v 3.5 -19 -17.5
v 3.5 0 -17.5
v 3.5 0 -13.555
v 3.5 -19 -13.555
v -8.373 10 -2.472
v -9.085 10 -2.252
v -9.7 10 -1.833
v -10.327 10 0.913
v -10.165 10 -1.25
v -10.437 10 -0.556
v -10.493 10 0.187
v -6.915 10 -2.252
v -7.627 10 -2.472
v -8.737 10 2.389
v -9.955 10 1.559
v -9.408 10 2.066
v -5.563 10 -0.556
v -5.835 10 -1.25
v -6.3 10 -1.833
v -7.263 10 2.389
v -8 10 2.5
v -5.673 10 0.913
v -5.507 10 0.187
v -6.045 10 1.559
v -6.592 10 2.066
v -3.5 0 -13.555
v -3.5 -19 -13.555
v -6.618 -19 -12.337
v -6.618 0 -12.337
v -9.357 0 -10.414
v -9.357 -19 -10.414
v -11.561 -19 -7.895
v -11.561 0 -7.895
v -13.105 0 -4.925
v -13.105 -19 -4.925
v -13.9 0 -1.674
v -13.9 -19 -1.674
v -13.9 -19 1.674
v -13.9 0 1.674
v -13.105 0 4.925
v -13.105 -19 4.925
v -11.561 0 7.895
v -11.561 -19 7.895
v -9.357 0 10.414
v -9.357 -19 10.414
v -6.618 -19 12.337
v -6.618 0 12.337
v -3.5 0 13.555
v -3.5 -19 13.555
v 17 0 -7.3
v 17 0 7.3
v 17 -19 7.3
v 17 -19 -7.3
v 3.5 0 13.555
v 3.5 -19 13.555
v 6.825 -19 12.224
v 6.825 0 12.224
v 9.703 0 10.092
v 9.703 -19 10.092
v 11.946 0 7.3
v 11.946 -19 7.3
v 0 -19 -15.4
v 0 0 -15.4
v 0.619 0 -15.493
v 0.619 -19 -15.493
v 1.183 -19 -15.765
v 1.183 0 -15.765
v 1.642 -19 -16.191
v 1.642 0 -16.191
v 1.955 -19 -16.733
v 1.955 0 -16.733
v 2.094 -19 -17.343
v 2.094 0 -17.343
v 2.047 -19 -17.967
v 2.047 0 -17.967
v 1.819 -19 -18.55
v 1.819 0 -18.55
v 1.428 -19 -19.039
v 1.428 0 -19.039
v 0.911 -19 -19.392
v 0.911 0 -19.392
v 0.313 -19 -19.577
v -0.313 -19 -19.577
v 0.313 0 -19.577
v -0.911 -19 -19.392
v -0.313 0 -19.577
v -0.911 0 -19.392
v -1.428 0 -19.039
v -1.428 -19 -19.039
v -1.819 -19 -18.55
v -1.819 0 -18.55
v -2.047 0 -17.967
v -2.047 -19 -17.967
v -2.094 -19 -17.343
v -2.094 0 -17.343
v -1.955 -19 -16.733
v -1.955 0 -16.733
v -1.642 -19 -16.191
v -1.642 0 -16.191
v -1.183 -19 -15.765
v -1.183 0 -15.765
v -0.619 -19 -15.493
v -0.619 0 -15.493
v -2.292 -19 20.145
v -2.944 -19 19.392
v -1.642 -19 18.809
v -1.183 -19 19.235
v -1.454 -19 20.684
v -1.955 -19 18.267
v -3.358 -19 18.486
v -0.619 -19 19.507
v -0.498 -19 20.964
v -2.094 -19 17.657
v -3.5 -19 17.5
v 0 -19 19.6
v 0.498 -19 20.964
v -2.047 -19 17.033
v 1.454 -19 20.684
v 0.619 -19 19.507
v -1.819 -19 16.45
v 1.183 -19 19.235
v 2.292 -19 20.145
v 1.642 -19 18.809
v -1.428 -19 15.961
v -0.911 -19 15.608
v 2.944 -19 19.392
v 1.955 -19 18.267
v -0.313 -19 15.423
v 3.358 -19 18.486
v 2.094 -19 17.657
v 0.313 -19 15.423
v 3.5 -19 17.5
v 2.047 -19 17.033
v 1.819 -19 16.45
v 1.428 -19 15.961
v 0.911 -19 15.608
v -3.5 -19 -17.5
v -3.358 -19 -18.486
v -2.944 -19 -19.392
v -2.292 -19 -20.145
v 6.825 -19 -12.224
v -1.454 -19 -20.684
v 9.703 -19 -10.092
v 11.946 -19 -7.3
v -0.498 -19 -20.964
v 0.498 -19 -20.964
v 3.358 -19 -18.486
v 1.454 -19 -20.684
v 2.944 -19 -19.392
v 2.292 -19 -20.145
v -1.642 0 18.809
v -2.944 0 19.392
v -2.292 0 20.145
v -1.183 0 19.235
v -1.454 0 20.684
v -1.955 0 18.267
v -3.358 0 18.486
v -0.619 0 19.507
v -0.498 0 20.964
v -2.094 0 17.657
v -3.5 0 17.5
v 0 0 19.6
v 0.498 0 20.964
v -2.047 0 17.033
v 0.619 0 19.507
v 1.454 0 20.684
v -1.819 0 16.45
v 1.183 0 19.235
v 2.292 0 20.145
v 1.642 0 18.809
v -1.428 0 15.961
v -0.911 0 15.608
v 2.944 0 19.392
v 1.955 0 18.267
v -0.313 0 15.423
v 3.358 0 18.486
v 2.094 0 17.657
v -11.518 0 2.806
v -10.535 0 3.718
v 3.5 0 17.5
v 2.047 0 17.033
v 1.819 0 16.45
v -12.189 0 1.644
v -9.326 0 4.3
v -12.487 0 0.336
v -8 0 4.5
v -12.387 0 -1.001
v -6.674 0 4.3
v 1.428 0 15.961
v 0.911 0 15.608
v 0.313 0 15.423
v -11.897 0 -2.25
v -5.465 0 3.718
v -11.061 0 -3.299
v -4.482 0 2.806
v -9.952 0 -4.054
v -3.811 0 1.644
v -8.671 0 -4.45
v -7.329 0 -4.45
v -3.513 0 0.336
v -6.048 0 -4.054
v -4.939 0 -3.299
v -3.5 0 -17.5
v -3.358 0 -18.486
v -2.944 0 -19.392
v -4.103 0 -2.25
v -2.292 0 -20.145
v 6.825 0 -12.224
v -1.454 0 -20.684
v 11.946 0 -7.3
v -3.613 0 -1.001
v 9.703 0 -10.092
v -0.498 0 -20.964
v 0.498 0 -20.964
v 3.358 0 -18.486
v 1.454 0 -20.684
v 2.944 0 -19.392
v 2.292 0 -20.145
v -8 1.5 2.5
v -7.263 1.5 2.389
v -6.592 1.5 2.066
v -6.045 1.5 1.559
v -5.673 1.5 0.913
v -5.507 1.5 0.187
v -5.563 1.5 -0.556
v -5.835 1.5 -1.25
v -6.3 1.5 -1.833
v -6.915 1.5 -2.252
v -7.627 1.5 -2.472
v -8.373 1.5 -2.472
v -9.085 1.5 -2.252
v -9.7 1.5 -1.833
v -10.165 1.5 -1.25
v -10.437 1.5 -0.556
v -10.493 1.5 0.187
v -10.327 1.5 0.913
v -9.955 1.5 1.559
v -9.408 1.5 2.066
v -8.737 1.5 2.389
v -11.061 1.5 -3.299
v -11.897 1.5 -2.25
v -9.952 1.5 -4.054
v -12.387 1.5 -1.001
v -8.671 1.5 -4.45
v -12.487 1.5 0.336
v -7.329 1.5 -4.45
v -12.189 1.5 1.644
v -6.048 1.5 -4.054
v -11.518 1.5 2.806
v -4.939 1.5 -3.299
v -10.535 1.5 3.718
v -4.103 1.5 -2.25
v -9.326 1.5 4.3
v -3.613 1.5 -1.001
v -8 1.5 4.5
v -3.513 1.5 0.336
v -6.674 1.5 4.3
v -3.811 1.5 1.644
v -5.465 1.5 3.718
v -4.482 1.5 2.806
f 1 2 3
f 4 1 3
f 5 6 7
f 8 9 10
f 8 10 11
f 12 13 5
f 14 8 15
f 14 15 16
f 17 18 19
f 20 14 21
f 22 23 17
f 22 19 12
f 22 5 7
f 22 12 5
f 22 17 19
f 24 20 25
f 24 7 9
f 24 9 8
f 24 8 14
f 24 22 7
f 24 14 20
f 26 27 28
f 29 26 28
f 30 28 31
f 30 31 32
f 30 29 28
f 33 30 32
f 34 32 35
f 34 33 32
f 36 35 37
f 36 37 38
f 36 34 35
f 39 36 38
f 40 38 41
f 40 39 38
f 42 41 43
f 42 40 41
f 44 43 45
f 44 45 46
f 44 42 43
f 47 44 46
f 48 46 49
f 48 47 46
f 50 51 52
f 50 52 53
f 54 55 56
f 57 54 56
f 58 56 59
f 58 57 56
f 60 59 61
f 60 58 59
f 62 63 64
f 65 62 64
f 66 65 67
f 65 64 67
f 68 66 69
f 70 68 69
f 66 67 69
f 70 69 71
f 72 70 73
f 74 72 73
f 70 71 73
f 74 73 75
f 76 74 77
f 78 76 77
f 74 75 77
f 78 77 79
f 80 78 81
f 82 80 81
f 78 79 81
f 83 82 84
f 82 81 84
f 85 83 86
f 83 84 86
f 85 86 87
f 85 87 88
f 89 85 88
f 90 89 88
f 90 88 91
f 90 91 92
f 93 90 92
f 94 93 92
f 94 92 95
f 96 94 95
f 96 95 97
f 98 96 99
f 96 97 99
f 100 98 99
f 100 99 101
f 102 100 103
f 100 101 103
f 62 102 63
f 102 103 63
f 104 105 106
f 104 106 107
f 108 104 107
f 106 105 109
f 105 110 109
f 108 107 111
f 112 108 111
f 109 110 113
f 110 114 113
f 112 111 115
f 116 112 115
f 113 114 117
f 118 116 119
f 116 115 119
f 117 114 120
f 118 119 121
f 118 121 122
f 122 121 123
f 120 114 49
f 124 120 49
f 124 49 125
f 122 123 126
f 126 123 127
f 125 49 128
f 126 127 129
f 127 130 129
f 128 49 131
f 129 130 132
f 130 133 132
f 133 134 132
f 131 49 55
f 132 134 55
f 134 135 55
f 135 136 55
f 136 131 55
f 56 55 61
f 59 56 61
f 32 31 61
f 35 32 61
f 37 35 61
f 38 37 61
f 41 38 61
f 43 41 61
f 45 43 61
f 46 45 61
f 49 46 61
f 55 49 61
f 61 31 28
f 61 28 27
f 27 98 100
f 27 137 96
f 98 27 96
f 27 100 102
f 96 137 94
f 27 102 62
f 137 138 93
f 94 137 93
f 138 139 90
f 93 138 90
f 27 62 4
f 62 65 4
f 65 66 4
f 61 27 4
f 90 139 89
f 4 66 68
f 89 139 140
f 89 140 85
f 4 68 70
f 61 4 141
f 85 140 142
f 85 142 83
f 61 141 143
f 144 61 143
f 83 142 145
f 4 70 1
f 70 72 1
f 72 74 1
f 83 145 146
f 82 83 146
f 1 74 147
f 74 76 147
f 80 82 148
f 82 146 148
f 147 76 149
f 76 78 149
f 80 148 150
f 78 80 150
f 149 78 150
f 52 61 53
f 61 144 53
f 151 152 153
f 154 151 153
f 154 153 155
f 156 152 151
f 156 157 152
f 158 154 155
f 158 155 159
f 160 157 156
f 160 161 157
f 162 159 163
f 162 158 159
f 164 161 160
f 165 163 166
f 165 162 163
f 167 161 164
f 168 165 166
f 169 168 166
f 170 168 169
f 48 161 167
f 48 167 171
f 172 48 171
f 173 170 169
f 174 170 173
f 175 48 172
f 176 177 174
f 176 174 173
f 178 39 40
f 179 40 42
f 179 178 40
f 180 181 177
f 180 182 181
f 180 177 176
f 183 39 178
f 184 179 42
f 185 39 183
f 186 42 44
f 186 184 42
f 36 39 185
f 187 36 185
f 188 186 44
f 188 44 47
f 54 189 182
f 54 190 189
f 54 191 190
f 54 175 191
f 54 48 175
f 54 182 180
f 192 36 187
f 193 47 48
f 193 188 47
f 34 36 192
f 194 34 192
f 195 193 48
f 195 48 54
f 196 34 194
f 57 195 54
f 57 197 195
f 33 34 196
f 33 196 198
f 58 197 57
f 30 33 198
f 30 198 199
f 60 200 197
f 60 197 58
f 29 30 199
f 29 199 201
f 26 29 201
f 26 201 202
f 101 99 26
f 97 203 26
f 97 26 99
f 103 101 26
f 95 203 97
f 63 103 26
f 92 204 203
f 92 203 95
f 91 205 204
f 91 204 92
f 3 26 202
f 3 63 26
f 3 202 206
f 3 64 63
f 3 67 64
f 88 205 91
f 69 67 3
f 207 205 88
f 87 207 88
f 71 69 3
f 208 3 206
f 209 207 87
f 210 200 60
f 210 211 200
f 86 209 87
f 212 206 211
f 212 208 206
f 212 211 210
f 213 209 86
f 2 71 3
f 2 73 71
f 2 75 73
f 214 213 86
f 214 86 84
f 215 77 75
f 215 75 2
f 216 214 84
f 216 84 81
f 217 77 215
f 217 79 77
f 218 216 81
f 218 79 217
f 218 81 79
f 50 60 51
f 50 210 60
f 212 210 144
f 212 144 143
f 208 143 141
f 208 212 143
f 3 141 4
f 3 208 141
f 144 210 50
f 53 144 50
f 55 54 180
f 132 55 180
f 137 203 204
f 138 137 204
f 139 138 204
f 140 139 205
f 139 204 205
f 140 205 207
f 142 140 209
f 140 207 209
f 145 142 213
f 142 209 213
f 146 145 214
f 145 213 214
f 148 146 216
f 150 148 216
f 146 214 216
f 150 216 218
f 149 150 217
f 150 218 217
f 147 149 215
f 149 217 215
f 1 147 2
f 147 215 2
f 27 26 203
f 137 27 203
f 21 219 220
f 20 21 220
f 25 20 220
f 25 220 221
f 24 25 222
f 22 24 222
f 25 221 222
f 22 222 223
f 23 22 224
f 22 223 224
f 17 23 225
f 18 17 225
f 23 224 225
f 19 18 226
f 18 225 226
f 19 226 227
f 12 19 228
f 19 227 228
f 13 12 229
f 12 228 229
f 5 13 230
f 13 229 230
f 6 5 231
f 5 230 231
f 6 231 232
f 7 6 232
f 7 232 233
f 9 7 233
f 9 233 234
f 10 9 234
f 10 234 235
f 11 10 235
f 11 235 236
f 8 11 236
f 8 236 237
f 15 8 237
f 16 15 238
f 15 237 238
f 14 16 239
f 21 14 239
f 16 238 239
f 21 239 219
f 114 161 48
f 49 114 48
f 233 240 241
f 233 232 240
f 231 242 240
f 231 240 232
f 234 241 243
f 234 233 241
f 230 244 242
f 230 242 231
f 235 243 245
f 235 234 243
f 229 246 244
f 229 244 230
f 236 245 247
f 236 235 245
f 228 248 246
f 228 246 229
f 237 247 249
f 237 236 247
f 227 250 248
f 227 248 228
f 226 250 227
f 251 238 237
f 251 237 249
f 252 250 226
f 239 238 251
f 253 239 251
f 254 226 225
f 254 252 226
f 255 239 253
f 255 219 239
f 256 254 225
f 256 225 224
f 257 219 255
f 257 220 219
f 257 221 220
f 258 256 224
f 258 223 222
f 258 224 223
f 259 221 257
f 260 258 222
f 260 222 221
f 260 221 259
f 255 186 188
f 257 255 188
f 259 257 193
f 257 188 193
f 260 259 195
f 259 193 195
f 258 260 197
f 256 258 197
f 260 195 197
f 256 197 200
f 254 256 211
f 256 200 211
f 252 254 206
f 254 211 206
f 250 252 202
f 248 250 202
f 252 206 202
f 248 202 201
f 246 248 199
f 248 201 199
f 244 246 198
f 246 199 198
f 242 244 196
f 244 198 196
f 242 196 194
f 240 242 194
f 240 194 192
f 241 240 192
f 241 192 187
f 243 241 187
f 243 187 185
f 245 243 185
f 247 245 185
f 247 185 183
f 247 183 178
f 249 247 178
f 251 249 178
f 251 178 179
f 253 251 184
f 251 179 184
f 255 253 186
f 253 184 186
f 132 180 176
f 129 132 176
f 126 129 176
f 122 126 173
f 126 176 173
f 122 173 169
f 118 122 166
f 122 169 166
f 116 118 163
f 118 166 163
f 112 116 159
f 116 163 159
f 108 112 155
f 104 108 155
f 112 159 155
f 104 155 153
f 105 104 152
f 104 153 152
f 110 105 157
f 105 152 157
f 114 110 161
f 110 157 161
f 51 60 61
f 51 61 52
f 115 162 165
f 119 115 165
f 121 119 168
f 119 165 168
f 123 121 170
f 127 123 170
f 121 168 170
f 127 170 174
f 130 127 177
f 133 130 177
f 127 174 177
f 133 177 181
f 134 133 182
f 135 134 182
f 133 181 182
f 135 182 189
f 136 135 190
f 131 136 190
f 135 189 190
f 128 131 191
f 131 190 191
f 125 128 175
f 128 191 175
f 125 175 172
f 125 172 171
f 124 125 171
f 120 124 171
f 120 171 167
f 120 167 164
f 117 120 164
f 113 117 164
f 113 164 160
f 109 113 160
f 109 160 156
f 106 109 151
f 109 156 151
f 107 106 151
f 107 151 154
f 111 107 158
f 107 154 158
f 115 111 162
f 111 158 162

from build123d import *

# Parameters (mm, degrees)
SKETCH1_R           = 14
SKETCH1_R_2         = 2.1
SKETCH1_W           = 5.05387092
SKETCH1_H           = 14.6
BOSS_EXTRUDE1_DEPTH = 19
SKETCH2_R           = 4.5
BOSS_EXTRUDE2_DEPTH = 1.5
SKETCH3_R           = 2.5
BOSS_EXTRUDE3_DEPTH = 8.5


with BuildPart() as part:
    # Sketch1 → Boss-Extrude1 (new body)
    # profile 1 of 3: a face of its own
    with BuildSketch(Plane(origin=(0, 0, 0), x_dir=(1, 0, 0), z_dir=(0, 1, 0))):
        Circle(SKETCH1_R)
    # profile 2 of 3: a face of its own
    with BuildSketch(Plane(origin=(0, 0, 0), x_dir=(1, 0, 0), z_dir=(0, 1, 0))):
        with BuildLine():
            Line((-3.5, -17.5), (-3.5, 17.5))
            ThreePointArc((-3.5, 17.5), (0, 21), (3.5, 17.5))
            Line((3.5, 17.5), (3.5, -17.5))
            ThreePointArc((3.5, -17.5), (0, -21), (-3.5, -17.5))
        make_face()
        with Locations(Location((0, -17.5, 0), (0, 0, 270))):
            Circle(SKETCH1_R_2, mode=Mode.SUBTRACT)
        with Locations(Location((0, 17.5, 0), (0, 0, 270))):
            Circle(SKETCH1_R_2, mode=Mode.SUBTRACT)
    # profile 3 of 3: a face of its own
    with BuildSketch(Plane(origin=(0, 0, 0), x_dir=(1, 0, 0), z_dir=(0, 1, 0))):
        with Locations((14.47306454, 0)):
            Rectangle(SKETCH1_W, SKETCH1_H)
    extrude(amount=-BOSS_EXTRUDE1_DEPTH)

    # Sketch2 → Boss-Extrude2 (add)
    with BuildSketch(Plane(origin=(0, 0, 0), x_dir=(1, 0, 0), z_dir=(0, 1, 0))):
        with Locations(Location((-8, 0, 0), (0, 0, 270))):
            Circle(SKETCH2_R)
    extrude(amount=BOSS_EXTRUDE2_DEPTH)

    # Sketch3 → Boss-Extrude3 (add)
    with BuildSketch(Plane(origin=(0, 1.5, 0), x_dir=(1, 0, 0), z_dir=(0, 1, 0))):
        with Locations(Location((-8, 0, 0), (0, 0, 270))):
            Circle(SKETCH3_R)
    extrude(amount=BOSS_EXTRUDE3_DEPTH)


solid = part.part
